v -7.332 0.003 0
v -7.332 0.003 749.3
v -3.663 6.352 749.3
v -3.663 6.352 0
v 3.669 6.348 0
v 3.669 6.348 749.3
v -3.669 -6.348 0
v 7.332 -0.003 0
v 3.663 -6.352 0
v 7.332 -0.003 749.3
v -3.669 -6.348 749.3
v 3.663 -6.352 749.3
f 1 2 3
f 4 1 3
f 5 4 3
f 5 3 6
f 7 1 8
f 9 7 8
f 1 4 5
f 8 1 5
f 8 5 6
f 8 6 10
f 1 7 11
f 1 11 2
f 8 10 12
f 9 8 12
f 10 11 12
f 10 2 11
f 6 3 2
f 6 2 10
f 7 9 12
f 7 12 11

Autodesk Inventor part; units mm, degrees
ref_plane "YZ Plane" through (0, 0, 0) normal (1, 0, 0) x (0, 1, 0)
ref_plane "XZ Plane" through (0, 0, 0) normal (0, 1, 0) x (-1, 0, 0)
ref_plane "XY Plane" through (0, 0, 0) normal (0, 0, 1) x (1, 0, 0)
sketch "Sketch1" plane through (0, 0, 0) normal (0, 0, 1) x (1, 0, 0)
  circle A0 centre (0, 0) radius 6.35
  line L0 (7.3323, -0.0033) -> (3.6633, -6.3517)
  line L1 (3.6633, -6.3517) -> (-3.6691, -6.3483)
  line L2 (-3.6691, -6.3483) -> (-7.3323, 0.0033)
  line L3 (-7.3323, 0.0033) -> (-3.6633, 6.3517)
  line L4 (-3.6633, 6.3517) -> (3.6691, 6.3483)
  line L5 (3.6691, 6.3483) -> (7.3323, -0.0033)
  point P0 (5.5007, 3.1725)
  dimension "d0" = 12.7
extrude "Extrusion1" add sketch "Sketch1" along normal blind 749.3
properties part number "4-bar intake shaft (29.5)"
